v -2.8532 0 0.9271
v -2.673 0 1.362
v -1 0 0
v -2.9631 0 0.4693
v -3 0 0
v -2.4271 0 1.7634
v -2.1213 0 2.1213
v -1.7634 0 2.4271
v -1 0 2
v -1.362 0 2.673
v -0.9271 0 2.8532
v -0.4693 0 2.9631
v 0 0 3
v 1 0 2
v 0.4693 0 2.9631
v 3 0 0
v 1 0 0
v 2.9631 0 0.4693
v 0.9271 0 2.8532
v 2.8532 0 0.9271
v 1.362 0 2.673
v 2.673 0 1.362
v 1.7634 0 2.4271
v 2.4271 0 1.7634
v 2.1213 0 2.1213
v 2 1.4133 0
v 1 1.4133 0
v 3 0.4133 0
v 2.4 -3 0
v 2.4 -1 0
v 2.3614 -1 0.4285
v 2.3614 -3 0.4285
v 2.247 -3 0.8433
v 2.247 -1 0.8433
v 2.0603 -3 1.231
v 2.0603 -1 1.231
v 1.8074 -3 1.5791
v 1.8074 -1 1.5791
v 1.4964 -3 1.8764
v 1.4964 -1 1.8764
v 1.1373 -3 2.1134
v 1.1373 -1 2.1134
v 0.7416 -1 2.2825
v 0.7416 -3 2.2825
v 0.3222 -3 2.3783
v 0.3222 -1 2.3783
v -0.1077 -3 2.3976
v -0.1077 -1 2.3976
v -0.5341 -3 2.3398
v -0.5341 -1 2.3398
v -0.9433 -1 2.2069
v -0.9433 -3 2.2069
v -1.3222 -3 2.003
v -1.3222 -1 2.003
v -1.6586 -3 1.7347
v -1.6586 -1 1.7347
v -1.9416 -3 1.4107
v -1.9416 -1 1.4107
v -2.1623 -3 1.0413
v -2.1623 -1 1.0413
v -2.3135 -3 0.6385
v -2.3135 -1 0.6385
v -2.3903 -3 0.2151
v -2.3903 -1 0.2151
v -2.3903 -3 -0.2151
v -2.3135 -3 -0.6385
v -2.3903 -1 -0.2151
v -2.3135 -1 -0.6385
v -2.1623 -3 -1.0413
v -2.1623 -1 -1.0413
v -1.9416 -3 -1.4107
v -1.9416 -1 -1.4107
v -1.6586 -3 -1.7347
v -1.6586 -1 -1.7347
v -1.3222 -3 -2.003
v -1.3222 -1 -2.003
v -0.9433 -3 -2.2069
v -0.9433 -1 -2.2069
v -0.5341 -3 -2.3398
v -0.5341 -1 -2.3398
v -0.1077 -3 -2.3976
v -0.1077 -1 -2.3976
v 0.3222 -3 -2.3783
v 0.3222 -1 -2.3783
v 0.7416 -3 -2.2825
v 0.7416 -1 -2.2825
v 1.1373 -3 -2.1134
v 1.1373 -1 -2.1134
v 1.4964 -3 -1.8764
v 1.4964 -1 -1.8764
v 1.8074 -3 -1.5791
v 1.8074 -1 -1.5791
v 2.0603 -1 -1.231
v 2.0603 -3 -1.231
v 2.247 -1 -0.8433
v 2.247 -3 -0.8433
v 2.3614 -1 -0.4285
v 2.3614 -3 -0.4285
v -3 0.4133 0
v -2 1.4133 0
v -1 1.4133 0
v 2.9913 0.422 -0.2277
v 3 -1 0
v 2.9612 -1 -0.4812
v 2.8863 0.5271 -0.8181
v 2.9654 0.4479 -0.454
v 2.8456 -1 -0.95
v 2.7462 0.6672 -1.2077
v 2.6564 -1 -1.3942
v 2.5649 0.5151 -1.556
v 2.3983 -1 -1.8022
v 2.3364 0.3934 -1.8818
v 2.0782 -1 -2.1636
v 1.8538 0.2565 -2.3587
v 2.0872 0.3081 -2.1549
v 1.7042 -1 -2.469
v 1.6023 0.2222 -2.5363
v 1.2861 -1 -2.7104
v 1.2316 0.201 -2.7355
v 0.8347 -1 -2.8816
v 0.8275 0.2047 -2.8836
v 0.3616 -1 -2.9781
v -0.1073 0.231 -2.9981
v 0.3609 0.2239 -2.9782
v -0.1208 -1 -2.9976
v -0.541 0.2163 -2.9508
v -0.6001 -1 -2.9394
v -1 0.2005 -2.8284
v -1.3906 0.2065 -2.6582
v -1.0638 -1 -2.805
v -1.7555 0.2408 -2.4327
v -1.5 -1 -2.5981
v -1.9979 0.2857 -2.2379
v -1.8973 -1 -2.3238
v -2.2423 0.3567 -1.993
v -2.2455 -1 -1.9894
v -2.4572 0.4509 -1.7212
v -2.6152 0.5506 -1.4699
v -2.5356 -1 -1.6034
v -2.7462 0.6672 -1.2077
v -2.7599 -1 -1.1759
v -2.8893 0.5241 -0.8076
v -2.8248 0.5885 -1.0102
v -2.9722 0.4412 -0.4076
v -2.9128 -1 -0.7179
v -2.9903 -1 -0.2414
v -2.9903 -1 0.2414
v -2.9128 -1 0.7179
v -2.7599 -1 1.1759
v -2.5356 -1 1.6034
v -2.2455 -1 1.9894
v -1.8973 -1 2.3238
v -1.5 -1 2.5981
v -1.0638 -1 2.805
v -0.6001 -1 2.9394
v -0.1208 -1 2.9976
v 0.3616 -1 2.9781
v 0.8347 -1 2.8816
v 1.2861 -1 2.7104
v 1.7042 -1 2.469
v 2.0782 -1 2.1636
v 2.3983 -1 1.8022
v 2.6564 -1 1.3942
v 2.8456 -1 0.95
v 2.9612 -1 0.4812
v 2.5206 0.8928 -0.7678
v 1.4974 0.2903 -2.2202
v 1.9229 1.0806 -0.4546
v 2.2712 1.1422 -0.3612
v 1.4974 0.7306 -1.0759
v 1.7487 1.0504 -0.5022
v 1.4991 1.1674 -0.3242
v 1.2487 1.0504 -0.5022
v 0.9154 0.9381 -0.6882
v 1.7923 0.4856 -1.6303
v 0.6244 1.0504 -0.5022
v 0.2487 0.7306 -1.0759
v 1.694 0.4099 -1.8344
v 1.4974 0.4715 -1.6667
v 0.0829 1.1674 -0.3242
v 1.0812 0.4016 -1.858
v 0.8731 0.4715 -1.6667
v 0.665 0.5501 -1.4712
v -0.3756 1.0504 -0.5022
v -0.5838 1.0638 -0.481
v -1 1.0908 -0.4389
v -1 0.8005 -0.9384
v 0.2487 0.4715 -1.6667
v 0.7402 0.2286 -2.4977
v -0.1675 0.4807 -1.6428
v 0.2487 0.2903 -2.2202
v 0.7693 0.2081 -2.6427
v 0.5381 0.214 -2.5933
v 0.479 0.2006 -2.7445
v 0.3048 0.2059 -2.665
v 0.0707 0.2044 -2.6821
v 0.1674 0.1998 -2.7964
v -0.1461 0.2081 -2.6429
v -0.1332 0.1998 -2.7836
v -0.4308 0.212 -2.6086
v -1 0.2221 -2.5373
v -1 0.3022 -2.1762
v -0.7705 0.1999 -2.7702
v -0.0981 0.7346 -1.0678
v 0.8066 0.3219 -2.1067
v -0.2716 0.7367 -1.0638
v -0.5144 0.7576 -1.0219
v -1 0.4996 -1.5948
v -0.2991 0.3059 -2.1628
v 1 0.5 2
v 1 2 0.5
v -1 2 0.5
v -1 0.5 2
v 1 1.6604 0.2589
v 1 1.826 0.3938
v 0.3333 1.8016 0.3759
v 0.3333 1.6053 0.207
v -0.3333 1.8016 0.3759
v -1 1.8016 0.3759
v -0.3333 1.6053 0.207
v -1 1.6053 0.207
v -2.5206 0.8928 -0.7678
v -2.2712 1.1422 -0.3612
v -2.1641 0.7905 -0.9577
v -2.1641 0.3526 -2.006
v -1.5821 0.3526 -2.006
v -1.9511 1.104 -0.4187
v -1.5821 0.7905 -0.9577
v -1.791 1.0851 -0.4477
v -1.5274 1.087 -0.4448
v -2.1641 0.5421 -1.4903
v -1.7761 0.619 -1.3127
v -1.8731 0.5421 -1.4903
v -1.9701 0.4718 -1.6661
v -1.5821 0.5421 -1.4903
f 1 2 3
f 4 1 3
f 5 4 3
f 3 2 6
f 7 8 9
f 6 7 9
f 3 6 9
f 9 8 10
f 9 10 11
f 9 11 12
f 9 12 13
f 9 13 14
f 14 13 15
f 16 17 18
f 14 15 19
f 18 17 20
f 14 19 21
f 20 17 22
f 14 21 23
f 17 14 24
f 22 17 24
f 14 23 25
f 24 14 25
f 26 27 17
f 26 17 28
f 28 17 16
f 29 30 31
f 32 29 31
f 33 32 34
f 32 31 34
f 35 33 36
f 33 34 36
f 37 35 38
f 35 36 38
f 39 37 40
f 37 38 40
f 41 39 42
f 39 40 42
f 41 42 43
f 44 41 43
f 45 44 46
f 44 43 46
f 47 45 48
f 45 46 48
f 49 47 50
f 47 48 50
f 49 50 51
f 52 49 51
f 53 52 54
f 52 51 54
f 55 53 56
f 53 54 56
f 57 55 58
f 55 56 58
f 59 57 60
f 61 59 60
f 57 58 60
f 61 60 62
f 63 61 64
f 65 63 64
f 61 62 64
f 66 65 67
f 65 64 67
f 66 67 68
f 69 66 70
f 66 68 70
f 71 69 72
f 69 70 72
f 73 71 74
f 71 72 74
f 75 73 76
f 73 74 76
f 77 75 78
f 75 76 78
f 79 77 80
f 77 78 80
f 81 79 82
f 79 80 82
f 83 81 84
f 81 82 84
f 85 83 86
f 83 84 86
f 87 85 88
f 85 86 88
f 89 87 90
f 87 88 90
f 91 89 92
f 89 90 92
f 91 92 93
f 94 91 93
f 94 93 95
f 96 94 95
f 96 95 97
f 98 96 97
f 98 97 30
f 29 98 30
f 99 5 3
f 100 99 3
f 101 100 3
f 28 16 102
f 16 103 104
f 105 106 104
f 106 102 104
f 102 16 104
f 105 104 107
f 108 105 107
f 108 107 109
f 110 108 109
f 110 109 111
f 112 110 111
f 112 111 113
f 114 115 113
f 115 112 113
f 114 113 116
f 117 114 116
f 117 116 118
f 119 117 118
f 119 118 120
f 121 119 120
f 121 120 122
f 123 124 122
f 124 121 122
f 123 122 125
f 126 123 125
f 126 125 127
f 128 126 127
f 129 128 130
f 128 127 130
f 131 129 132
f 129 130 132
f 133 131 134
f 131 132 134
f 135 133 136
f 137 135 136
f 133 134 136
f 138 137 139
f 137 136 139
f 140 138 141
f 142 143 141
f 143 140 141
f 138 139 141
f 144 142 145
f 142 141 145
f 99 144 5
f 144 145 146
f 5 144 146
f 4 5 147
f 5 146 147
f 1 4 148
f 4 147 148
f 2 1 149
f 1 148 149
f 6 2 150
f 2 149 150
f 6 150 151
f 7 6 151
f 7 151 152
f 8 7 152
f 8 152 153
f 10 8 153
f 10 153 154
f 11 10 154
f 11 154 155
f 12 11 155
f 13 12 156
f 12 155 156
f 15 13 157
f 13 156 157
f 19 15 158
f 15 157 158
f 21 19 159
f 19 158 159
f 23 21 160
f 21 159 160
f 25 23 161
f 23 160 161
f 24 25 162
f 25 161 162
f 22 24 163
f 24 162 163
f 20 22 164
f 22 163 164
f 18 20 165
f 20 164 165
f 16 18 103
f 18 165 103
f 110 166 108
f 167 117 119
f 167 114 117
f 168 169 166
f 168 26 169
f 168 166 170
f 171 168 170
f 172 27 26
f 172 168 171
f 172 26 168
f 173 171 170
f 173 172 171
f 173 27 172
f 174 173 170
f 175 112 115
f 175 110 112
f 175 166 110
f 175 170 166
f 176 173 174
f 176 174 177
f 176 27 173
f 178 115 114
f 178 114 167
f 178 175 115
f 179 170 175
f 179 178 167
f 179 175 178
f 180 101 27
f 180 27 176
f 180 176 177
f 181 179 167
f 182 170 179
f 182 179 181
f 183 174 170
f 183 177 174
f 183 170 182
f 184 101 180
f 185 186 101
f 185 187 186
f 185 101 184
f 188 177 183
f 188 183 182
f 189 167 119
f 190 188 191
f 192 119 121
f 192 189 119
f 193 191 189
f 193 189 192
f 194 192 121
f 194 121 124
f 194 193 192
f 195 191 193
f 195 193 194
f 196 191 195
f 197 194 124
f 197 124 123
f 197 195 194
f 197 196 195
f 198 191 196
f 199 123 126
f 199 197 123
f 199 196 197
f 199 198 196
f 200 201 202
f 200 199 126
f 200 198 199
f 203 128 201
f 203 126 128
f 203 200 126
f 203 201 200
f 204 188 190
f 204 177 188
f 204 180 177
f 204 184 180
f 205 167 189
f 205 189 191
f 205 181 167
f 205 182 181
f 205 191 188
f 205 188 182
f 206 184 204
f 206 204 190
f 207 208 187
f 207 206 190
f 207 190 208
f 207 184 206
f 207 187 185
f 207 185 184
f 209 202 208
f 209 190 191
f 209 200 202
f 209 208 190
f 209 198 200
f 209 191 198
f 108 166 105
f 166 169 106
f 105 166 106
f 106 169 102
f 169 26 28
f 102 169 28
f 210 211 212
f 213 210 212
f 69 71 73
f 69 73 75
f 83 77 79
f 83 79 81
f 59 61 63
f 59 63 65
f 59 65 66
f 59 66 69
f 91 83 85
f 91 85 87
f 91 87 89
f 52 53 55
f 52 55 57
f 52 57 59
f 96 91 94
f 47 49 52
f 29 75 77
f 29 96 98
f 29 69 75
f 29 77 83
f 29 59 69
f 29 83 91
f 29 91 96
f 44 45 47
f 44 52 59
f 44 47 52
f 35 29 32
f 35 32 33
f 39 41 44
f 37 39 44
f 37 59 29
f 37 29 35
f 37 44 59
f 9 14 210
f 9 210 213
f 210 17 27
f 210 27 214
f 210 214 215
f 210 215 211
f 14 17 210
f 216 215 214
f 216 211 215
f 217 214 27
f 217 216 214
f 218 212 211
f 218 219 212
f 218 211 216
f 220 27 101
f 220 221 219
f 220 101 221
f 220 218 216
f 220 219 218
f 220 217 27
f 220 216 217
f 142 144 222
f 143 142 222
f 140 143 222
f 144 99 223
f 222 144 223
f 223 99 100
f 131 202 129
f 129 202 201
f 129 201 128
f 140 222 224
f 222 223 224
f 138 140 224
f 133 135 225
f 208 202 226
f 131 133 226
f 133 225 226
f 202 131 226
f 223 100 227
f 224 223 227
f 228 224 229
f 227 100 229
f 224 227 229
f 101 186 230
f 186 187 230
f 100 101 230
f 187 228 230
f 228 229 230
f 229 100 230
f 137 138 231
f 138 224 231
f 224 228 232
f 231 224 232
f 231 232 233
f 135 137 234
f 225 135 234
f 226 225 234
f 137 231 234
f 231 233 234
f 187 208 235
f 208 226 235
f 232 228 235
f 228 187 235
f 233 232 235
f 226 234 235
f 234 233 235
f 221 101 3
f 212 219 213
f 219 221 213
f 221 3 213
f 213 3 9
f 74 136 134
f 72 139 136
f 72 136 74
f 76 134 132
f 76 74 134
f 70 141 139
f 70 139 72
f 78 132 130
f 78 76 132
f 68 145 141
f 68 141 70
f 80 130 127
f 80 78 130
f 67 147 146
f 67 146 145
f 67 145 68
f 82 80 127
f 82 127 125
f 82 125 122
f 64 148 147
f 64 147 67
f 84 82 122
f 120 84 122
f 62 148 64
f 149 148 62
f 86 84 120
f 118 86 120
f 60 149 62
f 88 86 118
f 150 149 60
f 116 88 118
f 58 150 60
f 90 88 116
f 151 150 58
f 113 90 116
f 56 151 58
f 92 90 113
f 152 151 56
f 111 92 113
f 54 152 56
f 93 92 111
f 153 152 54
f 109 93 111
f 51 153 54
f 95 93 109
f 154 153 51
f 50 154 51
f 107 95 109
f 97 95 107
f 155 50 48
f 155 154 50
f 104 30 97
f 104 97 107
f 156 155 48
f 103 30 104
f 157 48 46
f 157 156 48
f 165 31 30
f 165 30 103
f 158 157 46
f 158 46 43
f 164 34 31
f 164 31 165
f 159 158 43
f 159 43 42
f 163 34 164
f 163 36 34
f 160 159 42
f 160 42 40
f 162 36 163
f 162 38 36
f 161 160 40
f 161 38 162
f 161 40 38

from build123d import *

# Parameters (mm, degrees)
F0_R          = 3
F1_DEPTH      = 1
F2_R          = 2.4
F2_R_2        = 1.4
F3_DEPTH      = 2
F4_W          = 2
F4_H          = 2
F5_DEPTH      = 2
F6_SIZE       = 1.5
F8_DEPTH      = 25
F8_DEPTH_BACK = 25
F11_DEPTH     = 25


with BuildPart() as f1:
    # F0 (on Front) → F1 (new body)
    with BuildSketch(Plane.XZ):
        Circle(F0_R)
    extrude(amount=F1_DEPTH)

    # F2 (on face) → F3 (join)
    with BuildSketch(Plane.XZ.offset(1)):
        Circle(F2_R)
        Circle(F2_R_2, mode=Mode.SUBTRACT)
        Circle(F2_R_2)
    extrude(amount=F3_DEPTH)

    # F4 (on face) → F5 (join)
    with BuildSketch(Plane(origin=(0, 0, 0), x_dir=(-1, 0, 0), z_dir=(0, 1, 0))):
        with Locations((0, 1)):
            Rectangle(F4_W, F4_H)
        with BuildLine():
            Line((-1, 0), (-3, 0))
            ThreePointArc((-3, 0), (0, -3), (3, 0))
            Line((3, 0), (1, 0))
            Line((1, 0), (-1, 0))
        make_face()
    extrude(amount=F5_DEPTH)

    # F6
    f6_edges = [f1.edges().sort_by_distance(p)[0] for p in [
        (0, 2, 2),
    ]]
    chamfer(f6_edges, length=F6_SIZE)

    # F7 (on face) → F8 (cut, two sides)
    with BuildSketch(Plane(origin=(-1, 0, 0), x_dir=(0, -1, 0), z_dir=(-1, 0, 0))) as f8_sk:
        with BuildLine():
            add(Edge.make_bspline(
                [(-2, 0.5), (-1.8012148761, 0.400607438), (-1.6024297521, 0.2238049575), (-1.4133396134, 0)],
                knots=[0, 0, 0, 0, 0.7803205861, 0.7803205861, 0.7803205861, 0.7803205861], degree=3))
            Line((-2, 0.5), (-2, 0))
            Line((-2, 0), (-1.4133396134, 0))
        make_face()
        with BuildLine():
            Line((-1.4133396134, 0), (-2, 0))
            Line((-2, 0), (-2, -3.0058792327))
            Line((-2, -3.0058792327), (-0.234228326, -3.0058792327))
            add(Edge.make_bspline(
                [(-1.4133396134, 0), (-0.651200933, -0.9020587545), (-0.0465611068, -2.5676912631), (-0.234228326, -3.0058792327)],
                knots=[0.7803205861, 0.7803205861, 0.7803205861, 0.7803205861, 3.9254475921, 3.9254475921, 3.9254475921, 3.9254475921], degree=3))
        make_face()
    extrude(amount=-F8_DEPTH, mode=Mode.SUBTRACT)
    extrude(f8_sk.sketch, amount=F8_DEPTH_BACK, mode=Mode.SUBTRACT)

    # F10 (on face) + F9 (on face) → F11 (cut)
    with BuildSketch(Plane.XY):
        Polygon((-2, 1.4133396134), (-3, 1.4133396134), (-3, 0.4133396134), align=None)
    with BuildSketch(Plane.XY):
        Polygon((3, 0.4133396134), (3, 1.4133396134), (2, 1.4133396134), align=None)
    extrude(amount=-F11_DEPTH, mode=Mode.SUBTRACT)


solid = f1.part
